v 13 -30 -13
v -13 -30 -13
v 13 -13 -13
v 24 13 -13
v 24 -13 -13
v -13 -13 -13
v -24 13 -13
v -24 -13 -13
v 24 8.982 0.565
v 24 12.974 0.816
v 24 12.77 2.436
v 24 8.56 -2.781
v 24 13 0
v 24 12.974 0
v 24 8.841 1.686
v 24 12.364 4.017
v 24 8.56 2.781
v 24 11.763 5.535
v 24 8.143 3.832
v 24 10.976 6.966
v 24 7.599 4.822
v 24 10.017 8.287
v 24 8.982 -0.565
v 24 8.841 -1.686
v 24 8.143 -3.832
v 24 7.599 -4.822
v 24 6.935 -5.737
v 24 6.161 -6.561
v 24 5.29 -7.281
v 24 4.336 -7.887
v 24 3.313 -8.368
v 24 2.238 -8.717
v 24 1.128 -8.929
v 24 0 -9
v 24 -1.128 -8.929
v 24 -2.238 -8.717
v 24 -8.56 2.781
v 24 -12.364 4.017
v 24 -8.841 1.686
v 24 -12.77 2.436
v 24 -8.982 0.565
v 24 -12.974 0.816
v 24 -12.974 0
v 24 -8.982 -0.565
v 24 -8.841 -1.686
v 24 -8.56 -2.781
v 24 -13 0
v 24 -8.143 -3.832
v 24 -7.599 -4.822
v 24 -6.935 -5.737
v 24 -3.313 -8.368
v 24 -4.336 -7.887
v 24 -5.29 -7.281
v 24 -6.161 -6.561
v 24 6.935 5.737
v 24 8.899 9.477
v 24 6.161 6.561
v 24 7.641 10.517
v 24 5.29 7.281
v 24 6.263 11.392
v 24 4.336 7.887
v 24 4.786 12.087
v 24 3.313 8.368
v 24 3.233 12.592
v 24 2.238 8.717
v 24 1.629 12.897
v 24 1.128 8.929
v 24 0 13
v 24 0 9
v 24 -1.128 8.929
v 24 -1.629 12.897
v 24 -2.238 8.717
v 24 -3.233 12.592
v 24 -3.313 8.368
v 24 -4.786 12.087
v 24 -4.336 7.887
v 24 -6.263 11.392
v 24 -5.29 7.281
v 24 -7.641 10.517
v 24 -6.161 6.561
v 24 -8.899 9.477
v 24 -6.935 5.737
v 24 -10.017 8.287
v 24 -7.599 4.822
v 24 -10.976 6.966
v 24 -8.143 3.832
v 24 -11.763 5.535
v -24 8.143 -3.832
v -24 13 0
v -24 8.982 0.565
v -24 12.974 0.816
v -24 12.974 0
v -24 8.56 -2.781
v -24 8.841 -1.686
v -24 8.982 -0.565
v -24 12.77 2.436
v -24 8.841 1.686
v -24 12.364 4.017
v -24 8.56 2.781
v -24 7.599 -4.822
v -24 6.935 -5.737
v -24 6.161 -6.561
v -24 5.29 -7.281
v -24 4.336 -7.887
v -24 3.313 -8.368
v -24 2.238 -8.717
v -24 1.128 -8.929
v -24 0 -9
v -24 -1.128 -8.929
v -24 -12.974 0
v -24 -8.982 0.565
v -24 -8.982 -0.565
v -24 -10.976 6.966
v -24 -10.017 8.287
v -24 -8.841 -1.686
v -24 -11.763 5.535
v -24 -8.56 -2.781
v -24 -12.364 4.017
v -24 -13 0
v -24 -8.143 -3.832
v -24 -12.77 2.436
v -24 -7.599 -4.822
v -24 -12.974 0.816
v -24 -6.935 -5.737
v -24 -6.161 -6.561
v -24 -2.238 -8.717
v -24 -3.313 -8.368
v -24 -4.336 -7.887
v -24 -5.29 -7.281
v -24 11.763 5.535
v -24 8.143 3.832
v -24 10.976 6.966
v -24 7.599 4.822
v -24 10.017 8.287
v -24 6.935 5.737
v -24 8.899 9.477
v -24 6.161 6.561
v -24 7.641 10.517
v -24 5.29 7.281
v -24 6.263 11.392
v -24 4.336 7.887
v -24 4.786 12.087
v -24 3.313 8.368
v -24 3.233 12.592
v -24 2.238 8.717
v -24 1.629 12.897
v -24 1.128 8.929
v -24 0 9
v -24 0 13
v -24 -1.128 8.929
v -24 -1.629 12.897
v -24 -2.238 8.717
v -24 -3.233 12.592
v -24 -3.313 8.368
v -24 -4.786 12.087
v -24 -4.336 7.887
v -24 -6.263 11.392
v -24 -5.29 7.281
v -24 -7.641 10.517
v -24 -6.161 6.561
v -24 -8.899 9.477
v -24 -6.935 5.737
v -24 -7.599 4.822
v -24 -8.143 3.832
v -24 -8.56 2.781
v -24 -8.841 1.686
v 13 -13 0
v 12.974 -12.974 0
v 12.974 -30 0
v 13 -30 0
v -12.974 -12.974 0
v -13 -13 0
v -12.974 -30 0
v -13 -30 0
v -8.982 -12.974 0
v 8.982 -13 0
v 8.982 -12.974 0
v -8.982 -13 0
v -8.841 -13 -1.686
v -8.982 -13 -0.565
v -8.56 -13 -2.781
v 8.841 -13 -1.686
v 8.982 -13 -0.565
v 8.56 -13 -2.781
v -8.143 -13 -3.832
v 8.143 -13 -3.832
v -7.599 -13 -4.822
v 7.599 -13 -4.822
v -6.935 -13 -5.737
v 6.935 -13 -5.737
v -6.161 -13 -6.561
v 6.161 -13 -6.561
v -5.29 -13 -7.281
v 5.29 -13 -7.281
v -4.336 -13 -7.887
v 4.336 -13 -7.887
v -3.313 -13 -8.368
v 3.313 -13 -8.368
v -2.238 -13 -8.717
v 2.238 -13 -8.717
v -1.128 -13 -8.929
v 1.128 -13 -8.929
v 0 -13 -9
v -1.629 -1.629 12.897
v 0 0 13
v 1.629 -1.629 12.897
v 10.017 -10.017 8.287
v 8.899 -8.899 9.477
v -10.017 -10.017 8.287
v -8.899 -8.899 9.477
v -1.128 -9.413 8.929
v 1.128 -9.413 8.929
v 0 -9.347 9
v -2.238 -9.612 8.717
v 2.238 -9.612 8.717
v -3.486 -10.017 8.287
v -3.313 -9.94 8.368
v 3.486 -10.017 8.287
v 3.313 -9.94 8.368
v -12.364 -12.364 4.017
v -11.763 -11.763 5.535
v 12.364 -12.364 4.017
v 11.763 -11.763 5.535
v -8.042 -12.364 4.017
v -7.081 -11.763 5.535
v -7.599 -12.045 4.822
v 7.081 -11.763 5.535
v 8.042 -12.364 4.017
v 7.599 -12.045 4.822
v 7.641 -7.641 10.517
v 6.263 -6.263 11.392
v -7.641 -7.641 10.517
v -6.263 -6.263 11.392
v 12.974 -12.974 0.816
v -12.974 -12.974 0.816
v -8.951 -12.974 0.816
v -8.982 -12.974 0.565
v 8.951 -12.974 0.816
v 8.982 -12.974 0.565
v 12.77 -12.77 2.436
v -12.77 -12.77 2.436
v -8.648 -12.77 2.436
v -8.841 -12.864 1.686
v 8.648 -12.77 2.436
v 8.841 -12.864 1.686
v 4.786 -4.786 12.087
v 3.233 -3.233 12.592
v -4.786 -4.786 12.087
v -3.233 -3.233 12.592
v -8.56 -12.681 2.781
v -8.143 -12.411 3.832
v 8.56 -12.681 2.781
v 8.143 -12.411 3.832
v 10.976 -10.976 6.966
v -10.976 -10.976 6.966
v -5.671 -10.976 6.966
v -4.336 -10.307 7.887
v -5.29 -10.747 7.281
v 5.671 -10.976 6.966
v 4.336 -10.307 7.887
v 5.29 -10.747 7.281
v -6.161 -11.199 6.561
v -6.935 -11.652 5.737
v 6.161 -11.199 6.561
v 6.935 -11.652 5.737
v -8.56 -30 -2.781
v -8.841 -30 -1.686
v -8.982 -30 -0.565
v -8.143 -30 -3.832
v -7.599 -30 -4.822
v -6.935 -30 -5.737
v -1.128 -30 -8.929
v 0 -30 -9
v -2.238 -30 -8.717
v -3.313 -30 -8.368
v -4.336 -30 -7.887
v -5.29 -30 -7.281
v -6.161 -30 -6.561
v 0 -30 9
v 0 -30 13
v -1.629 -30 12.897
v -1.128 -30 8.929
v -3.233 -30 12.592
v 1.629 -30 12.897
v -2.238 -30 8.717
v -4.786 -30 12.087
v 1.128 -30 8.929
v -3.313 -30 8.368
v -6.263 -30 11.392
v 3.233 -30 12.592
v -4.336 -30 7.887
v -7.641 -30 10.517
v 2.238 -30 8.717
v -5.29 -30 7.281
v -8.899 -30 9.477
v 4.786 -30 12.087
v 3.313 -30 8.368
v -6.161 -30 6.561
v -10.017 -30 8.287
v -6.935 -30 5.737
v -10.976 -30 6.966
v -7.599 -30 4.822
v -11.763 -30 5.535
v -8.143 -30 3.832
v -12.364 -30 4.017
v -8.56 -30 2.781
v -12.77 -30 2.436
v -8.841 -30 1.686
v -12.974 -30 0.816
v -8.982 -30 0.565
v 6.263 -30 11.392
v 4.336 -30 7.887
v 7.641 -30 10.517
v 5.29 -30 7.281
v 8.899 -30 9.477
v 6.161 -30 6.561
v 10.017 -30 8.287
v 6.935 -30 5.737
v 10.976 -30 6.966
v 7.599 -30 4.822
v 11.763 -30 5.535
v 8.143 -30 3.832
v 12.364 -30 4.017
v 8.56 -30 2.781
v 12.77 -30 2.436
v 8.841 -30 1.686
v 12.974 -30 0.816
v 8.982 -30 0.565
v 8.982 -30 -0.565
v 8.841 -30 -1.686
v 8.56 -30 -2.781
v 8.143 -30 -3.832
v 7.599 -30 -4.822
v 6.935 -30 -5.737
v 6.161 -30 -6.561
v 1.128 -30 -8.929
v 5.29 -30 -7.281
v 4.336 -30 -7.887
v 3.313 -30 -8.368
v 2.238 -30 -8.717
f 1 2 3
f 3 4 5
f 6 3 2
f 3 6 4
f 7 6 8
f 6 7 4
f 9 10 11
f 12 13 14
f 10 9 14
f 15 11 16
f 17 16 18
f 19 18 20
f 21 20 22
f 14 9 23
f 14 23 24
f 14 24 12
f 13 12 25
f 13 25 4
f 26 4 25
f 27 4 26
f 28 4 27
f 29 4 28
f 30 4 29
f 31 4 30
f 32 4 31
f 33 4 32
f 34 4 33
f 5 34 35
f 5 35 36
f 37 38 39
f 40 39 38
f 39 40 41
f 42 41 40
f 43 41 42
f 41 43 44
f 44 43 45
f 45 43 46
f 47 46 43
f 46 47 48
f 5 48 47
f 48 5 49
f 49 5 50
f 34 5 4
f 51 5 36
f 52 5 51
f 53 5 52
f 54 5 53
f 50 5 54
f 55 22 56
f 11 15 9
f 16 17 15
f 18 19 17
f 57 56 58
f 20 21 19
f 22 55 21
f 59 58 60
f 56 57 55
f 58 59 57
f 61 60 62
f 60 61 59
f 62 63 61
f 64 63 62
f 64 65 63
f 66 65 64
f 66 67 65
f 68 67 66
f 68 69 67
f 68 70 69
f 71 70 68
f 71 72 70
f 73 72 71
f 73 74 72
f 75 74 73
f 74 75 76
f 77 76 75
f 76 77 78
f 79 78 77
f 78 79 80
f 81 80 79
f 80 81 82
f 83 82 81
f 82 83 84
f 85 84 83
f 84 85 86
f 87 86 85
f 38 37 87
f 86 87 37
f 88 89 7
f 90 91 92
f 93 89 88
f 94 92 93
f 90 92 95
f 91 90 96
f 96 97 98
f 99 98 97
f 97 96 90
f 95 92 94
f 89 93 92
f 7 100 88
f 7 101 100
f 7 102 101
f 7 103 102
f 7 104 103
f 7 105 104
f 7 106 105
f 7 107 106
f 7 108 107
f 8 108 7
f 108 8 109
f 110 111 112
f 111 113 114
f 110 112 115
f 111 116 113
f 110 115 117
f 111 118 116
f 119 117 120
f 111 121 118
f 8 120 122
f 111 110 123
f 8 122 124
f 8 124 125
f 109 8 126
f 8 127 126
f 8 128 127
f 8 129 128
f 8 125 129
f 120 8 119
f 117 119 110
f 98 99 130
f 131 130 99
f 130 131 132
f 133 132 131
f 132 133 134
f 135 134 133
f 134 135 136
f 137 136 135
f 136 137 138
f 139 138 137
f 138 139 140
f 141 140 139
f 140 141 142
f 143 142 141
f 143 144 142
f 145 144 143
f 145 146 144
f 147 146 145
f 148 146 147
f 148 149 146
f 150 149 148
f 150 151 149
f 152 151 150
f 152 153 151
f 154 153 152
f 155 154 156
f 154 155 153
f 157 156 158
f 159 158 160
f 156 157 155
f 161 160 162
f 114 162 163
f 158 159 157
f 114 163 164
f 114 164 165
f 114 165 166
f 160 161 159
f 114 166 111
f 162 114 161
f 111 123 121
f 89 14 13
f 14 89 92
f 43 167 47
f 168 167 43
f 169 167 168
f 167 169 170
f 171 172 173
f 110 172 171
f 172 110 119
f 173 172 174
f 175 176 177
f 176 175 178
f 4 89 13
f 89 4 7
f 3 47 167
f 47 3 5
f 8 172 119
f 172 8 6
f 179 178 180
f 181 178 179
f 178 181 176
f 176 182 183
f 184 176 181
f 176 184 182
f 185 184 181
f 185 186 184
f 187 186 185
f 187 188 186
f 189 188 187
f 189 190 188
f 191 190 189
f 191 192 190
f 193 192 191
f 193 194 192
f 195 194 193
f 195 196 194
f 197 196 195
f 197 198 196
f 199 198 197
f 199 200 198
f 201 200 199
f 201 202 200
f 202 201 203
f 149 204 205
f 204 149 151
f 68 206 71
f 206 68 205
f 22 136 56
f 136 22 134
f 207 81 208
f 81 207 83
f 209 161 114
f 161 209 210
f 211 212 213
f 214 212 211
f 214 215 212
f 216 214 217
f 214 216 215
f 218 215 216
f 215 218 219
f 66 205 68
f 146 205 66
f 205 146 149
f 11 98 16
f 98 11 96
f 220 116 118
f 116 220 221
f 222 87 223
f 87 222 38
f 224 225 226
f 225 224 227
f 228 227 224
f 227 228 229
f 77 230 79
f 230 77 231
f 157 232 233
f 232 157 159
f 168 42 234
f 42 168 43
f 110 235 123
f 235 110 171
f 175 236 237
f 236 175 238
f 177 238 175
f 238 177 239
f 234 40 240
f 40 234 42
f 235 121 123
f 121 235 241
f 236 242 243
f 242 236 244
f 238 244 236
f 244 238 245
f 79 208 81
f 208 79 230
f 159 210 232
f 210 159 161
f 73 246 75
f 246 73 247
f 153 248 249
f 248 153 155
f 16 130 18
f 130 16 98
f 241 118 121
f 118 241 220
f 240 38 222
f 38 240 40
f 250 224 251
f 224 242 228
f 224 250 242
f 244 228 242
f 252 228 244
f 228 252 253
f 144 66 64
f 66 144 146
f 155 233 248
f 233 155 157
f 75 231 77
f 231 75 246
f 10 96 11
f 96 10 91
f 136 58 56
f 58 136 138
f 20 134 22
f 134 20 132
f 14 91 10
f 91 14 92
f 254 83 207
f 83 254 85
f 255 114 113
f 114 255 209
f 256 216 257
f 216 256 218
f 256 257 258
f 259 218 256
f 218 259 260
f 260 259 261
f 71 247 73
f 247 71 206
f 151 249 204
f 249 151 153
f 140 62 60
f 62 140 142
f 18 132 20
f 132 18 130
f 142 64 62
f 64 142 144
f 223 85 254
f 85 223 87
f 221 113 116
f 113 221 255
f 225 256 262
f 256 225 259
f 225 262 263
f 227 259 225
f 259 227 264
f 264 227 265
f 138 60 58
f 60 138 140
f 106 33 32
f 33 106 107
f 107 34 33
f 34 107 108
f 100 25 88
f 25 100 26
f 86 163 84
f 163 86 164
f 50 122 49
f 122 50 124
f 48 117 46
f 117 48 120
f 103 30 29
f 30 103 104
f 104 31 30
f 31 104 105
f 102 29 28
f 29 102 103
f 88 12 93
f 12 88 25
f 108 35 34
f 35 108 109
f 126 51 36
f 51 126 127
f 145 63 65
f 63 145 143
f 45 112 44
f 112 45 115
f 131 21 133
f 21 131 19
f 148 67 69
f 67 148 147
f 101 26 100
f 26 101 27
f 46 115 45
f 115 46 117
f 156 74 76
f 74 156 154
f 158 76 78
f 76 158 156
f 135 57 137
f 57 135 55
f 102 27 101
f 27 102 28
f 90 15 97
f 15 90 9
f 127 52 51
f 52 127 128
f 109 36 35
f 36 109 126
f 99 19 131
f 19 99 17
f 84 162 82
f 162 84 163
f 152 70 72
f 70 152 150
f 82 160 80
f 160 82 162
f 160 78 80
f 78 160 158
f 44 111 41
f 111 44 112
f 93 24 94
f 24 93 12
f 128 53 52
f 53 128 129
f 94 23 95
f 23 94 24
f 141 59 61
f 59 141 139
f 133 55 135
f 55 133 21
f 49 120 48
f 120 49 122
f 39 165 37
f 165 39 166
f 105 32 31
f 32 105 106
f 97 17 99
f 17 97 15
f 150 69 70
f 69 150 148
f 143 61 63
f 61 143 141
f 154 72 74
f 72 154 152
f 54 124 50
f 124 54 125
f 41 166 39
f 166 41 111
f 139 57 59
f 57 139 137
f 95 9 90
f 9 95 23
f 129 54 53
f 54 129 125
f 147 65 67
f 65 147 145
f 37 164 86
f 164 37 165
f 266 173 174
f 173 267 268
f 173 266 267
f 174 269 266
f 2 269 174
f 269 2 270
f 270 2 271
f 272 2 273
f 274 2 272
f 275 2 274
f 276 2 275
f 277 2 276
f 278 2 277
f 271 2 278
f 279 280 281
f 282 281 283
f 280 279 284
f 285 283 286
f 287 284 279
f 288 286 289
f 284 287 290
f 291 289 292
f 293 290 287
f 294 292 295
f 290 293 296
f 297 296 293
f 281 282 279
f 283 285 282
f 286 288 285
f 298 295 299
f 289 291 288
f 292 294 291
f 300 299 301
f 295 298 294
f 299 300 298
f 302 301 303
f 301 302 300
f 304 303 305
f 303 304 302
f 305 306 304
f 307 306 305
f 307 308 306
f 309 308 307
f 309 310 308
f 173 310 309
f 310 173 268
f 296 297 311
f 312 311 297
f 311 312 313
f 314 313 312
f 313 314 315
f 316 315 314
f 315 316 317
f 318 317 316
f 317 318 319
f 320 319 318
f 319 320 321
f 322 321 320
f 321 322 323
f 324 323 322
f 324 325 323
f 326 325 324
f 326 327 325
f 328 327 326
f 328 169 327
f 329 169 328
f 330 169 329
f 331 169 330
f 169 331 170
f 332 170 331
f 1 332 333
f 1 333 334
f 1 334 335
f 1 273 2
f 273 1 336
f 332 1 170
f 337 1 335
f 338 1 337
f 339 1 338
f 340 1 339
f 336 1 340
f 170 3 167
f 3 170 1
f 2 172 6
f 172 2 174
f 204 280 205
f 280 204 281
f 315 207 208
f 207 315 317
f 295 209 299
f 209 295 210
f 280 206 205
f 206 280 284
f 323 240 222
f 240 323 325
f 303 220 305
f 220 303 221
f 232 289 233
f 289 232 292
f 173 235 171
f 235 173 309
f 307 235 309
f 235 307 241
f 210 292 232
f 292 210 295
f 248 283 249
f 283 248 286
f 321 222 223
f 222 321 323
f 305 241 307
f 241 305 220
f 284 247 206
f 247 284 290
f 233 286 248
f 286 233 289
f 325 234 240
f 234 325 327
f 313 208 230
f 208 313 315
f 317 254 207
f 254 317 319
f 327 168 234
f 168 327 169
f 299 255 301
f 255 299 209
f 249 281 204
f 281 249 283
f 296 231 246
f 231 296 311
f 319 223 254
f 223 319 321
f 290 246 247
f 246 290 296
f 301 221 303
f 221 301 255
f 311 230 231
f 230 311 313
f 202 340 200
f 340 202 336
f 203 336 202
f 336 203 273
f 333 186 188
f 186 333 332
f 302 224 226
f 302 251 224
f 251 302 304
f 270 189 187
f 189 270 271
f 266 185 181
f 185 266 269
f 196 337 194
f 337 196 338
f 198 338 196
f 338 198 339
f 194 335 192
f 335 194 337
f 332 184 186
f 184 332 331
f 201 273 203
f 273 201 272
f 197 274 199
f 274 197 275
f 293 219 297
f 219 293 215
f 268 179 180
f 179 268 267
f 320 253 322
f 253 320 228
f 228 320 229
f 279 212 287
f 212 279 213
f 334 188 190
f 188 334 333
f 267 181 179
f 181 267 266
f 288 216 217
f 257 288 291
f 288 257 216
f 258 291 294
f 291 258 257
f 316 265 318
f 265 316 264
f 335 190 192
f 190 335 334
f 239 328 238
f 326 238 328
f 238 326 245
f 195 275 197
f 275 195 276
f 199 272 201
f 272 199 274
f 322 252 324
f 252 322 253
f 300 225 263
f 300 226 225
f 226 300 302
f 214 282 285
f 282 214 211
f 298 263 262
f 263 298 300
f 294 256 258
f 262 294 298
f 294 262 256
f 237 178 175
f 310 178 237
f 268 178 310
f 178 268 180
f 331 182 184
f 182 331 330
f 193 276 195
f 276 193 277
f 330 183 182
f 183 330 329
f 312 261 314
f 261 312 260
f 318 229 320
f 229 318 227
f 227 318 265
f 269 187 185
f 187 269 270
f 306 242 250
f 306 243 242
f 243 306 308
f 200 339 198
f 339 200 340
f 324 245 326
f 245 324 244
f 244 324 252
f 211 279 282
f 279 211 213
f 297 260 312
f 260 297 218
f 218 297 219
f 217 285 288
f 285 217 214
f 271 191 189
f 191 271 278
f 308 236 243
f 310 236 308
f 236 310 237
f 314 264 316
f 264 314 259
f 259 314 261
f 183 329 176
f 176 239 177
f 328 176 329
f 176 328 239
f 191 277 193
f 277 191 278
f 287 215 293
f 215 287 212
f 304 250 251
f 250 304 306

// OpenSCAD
//Helical yagi T mount
//by cshields

pvc_width=18;
wall_width=8;

$fn=50;

long_length=48;
short_length=30;

module holder(pvc, wall, len) {
	total_diameter = pvc+wall;
	difference() {
		union() {
			translate([total_diameter/4,0,0])
				cube([total_diameter/2,total_diameter,len],center=true);
			cylinder(d=total_diameter,h=len,center=true);
		}
		cylinder(d=pvc,h=len+2,center=true);
	}
}

difference() {
	union() {
		rotate(90,[0,1,0])
			holder(pvc_width, wall_width, long_length);
		rotate([90,90,0])
			translate([0,0,short_length/2])
				holder(pvc_width, wall_width, short_length);
	}

	// extra cut to allow the bar to pass all the way through.
	rotate(90,[0,1,0])
		cylinder(d=pvc_width,h=long_length+2,center=true);
}
